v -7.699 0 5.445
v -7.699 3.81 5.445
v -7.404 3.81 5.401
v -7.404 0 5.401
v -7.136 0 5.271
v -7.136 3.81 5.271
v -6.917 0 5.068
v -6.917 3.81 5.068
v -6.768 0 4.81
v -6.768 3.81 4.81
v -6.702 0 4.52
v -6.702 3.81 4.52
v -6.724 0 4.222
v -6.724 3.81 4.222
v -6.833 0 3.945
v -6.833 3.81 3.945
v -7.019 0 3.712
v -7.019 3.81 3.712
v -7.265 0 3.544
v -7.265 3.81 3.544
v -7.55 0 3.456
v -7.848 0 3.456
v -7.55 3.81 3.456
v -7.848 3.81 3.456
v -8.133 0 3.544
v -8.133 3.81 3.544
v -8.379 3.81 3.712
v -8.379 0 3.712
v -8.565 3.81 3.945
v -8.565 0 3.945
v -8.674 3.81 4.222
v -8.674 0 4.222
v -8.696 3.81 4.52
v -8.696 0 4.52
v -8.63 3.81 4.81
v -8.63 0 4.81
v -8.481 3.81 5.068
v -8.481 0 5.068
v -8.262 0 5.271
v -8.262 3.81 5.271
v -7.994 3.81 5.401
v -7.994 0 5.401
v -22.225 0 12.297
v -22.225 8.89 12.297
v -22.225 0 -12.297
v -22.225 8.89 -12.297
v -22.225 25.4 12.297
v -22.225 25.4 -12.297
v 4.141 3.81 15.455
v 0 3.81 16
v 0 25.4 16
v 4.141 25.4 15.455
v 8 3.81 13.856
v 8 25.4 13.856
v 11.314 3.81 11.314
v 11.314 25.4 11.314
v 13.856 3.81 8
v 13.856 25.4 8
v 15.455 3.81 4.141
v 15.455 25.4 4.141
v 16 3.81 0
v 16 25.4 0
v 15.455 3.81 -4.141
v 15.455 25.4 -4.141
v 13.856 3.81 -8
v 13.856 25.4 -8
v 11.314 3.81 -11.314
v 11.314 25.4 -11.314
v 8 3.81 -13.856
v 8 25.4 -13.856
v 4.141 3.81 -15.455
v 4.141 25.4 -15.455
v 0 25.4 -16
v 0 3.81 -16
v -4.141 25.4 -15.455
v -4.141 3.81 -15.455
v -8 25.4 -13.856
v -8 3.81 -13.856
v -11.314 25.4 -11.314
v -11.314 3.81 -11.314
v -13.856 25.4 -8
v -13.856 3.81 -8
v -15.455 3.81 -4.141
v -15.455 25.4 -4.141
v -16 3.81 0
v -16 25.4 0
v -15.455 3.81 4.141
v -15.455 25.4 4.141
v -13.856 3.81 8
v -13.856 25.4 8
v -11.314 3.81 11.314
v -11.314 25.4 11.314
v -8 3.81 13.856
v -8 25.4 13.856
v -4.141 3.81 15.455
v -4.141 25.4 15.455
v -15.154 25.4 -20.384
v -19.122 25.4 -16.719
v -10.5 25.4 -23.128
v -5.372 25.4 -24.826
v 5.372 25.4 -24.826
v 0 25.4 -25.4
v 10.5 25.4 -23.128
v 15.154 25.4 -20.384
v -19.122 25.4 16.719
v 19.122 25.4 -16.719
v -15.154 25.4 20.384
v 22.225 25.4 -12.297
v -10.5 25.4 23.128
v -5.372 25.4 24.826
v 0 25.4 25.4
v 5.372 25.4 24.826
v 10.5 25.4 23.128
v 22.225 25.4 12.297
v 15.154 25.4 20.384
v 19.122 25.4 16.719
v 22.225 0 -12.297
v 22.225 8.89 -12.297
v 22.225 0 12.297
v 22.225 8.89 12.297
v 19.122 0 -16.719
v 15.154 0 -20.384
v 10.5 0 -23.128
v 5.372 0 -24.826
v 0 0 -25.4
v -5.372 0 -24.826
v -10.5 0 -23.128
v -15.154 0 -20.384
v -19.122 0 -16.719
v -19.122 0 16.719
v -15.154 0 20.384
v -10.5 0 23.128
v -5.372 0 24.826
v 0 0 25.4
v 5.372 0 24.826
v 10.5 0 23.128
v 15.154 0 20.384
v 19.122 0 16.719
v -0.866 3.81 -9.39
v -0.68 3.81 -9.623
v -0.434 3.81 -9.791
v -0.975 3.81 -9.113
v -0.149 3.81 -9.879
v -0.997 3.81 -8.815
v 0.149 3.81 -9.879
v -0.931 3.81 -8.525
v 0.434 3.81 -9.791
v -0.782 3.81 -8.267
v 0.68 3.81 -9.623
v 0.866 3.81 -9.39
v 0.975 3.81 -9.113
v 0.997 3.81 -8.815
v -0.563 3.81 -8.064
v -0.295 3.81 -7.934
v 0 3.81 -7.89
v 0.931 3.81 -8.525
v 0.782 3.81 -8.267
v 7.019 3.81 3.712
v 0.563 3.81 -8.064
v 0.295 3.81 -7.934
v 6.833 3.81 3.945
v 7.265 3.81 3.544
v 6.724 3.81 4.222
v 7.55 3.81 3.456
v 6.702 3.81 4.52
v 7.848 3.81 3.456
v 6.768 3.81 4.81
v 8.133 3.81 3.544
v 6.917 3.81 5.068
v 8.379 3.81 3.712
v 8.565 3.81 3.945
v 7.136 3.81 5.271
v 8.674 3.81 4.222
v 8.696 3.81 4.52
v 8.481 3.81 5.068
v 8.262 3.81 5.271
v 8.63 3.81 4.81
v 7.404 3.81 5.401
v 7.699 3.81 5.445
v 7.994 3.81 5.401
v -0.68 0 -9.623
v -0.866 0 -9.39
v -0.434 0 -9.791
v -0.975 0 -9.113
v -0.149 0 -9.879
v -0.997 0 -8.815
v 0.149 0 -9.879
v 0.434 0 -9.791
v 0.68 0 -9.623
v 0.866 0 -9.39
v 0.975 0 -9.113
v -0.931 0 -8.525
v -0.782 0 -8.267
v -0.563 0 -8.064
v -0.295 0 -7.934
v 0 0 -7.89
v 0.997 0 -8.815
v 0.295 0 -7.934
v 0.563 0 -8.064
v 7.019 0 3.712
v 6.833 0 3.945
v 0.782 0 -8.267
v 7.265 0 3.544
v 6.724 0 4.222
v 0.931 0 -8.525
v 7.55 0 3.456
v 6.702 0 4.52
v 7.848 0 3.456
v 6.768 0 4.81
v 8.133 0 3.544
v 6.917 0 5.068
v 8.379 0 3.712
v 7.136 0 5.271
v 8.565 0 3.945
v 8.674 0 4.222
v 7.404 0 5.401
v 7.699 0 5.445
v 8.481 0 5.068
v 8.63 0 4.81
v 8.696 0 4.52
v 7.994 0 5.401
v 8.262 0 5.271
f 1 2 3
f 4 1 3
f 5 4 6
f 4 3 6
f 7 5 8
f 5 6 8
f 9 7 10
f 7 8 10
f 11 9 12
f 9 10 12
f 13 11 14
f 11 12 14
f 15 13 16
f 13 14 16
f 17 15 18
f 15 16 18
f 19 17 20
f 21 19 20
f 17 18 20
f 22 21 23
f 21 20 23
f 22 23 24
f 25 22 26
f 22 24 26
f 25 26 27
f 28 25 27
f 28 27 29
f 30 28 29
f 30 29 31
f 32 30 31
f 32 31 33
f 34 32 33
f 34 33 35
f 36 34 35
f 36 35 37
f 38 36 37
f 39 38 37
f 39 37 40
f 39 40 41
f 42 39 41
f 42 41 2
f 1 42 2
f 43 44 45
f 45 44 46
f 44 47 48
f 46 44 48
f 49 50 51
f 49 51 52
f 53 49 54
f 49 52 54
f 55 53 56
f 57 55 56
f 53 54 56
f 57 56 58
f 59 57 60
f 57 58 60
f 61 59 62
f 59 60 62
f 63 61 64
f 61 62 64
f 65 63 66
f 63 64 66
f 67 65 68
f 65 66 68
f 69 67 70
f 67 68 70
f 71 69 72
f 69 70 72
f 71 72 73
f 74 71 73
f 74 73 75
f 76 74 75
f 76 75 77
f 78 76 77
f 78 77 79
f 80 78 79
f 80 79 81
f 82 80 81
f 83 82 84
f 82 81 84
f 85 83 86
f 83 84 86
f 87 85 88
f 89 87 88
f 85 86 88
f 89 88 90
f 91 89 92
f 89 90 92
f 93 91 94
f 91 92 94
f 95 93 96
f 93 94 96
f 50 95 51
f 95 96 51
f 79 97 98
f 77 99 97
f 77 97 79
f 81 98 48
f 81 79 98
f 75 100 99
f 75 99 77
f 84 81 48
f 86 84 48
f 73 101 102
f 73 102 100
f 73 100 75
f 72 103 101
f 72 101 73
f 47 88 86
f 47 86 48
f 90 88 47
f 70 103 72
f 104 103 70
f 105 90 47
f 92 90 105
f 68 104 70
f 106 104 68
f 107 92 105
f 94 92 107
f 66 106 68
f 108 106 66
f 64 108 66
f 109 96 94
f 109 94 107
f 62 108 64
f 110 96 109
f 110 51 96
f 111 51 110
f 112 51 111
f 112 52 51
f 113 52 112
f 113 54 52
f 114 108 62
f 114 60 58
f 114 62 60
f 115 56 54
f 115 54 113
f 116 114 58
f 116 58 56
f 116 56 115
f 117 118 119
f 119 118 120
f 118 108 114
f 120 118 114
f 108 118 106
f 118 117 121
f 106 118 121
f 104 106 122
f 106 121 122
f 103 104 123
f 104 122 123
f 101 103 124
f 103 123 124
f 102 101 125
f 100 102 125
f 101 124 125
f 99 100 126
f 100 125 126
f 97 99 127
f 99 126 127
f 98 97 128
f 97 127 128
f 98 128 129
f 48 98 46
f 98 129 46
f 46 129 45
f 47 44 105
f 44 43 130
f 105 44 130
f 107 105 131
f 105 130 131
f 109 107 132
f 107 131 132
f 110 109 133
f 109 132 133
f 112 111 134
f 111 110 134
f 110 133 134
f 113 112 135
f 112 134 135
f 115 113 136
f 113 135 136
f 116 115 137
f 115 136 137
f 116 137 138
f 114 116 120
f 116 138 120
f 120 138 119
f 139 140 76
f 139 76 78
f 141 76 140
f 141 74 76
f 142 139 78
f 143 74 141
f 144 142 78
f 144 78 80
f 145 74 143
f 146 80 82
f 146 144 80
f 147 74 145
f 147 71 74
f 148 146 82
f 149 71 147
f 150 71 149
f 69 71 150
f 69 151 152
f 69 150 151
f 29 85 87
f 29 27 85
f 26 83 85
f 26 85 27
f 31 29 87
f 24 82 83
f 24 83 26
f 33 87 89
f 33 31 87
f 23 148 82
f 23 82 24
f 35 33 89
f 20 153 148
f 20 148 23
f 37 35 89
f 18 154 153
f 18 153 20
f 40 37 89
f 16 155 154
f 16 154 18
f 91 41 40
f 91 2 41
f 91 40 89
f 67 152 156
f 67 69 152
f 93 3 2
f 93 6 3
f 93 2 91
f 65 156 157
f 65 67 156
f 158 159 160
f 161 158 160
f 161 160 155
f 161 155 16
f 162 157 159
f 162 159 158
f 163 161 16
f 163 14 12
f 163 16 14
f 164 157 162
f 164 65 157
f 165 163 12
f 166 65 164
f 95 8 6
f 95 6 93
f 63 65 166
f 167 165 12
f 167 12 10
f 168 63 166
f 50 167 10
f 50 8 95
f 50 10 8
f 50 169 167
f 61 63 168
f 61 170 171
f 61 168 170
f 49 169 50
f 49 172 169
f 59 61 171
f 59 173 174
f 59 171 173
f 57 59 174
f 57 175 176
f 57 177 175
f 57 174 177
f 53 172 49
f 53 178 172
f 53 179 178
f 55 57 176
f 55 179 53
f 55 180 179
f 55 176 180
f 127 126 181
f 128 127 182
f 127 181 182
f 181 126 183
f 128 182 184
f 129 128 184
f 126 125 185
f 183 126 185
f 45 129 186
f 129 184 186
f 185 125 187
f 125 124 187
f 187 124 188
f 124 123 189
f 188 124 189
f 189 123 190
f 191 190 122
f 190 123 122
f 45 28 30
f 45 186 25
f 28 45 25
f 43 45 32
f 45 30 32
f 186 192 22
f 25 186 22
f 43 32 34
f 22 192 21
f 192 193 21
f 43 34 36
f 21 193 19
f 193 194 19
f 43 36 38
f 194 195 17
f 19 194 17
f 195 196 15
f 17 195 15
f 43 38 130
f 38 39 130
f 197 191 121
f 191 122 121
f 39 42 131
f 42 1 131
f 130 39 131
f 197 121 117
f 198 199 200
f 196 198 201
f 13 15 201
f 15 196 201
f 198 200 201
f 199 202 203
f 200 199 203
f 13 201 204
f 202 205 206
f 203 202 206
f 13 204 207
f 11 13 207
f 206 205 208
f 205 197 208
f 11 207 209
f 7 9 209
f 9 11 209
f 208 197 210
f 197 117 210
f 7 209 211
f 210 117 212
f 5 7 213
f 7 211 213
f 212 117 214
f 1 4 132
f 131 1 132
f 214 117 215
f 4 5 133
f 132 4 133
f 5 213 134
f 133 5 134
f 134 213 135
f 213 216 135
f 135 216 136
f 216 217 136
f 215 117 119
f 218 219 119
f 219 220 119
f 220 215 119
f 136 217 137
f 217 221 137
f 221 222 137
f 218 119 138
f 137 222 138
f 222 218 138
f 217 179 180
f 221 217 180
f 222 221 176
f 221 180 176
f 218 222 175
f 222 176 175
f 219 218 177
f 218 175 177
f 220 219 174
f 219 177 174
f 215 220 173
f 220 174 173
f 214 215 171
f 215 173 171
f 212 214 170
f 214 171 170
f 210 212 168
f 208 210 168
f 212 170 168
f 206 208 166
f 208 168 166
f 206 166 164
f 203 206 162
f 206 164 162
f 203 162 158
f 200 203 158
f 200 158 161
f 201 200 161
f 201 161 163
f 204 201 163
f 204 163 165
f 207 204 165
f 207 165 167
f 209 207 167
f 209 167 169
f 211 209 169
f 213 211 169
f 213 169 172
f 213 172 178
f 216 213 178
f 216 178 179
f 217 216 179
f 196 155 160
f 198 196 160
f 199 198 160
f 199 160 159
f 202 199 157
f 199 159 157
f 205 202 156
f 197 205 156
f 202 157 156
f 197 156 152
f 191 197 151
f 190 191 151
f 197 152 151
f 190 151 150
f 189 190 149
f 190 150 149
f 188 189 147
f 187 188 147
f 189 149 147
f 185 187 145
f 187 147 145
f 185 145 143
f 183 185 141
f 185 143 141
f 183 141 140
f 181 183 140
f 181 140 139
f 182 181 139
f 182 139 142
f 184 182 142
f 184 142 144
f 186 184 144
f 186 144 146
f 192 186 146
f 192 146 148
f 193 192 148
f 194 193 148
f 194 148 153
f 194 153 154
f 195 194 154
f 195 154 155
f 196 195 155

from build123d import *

# Parameters (mm, degrees)
SKETCH1_R                           = 25.4
BOSS_EXTRUDE1_DEPTH                 = 25.4
SKETCH2_R                           = 16
CUT_EXTRUDE1_DEPTH                  = 21.59
CUT_EXTRUDE2_REACH                  = 45.994
CUT_EXTRUDE2_END_RADIUS             = 25.4
SKETCH3_W                           = 3.175
SKETCH3_H                           = 16.51
CUT_EXTRUDE2_DIRECTION_2_REACH      = 45.994
CUT_EXTRUDE2_DIRECTION_2_END_RADIUS = 25.4
CUT_EXTRUDE3_REACH                  = 43.91
SKETCH4_R                           = 1
CUT_EXTRUDE4_REACH                  = 41.534


with BuildPart() as part:
    # Sketch1 → Boss-Extrude1 (new body)
    with BuildSketch(Plane(origin=(0, 0, 0), x_dir=(1, 0, 0), z_dir=(0, 1, 0))):
        with Locations(Location((0, 0, 0), (0, 0, 270))):
            Circle(SKETCH1_R)
    extrude(amount=BOSS_EXTRUDE1_DEPTH)

    # Sketch2 → Cut-Extrude1 (cut)
    with BuildSketch(Plane(origin=(0, 25.4, 0), x_dir=(1, 0, 0), z_dir=(0, 1, 0))):
        with Locations(Location((0, 0, 0), (0, 0, 270))):
            Circle(SKETCH2_R)
    extrude(amount=-CUT_EXTRUDE1_DEPTH, mode=Mode.SUBTRACT)

    # Cut-Extrude2: up to this cylinder (the profile starts inside it)
    cut_extrude2_end = Plane(origin=(0, 17.145, 0), z_dir=(0, -1, 0)) * Cylinder(CUT_EXTRUDE2_END_RADIUS, 143.788, mode=Mode.PRIVATE)
    # Sketch3 → Cut-Extrude2 (cut, up to the surface)
    with BuildSketch(Plane.XY, mode=Mode.PRIVATE) as cut_extrude2_sk1:
        with Locations((23.8125, 17.145)):
            Rectangle(SKETCH3_W, SKETCH3_H)
    cut_extrude2_tool1 = extrude(cut_extrude2_sk1.sketch, amount=-CUT_EXTRUDE2_REACH, mode=Mode.PRIVATE) & cut_extrude2_end
    add(cut_extrude2_tool1.solids().sort_by_distance((23.8125, 17.145, 0))[0], mode=Mode.SUBTRACT)
    # Sketch3 → Cut-Extrude2 (cut, up to the surface)
    with BuildSketch(Plane.XY, mode=Mode.PRIVATE) as cut_extrude2_sk2:
        with Locations((-23.8125, 17.145)):
            Rectangle(SKETCH3_W, SKETCH3_H)
    cut_extrude2_tool2 = extrude(cut_extrude2_sk2.sketch, amount=-CUT_EXTRUDE2_REACH, mode=Mode.PRIVATE) & cut_extrude2_end
    add(cut_extrude2_tool2.solids().sort_by_distance((-23.8125, 17.145, 0))[0], mode=Mode.SUBTRACT)

    # Cut-Extrude2 direction 2: up to this cylinder (the profile starts inside it)
    cut_extrude2_direction_2_end = Plane(origin=(0, 17.145, 0), z_dir=(0, -1, 0)) * Cylinder(CUT_EXTRUDE2_DIRECTION_2_END_RADIUS, 143.788, mode=Mode.PRIVATE)
    # Sketch3 → Cut-Extrude2 direction 2 (cut, up to the surface)
    with BuildSketch(Plane.XY, mode=Mode.PRIVATE) as cut_extrude2_direction_2_sk1:
        with Locations((23.8125, 17.145)):
            Rectangle(SKETCH3_W, SKETCH3_H)
    cut_extrude2_direction_2_tool1 = extrude(cut_extrude2_direction_2_sk1.sketch, amount=CUT_EXTRUDE2_DIRECTION_2_REACH, mode=Mode.PRIVATE) & cut_extrude2_direction_2_end
    add(cut_extrude2_direction_2_tool1.solids().sort_by_distance((23.8125, 17.145, 0))[0], mode=Mode.SUBTRACT)
    # Sketch3 → Cut-Extrude2 direction 2 (cut, up to the surface)
    with BuildSketch(Plane.XY, mode=Mode.PRIVATE) as cut_extrude2_direction_2_sk2:
        with Locations((-23.8125, 17.145)):
            Rectangle(SKETCH3_W, SKETCH3_H)
    cut_extrude2_direction_2_tool2 = extrude(cut_extrude2_direction_2_sk2.sketch, amount=CUT_EXTRUDE2_DIRECTION_2_REACH, mode=Mode.PRIVATE) & cut_extrude2_direction_2_end
    add(cut_extrude2_direction_2_tool2.solids().sort_by_distance((-23.8125, 17.145, 0))[0], mode=Mode.SUBTRACT)

    # Sketch4 → Cut-Extrude3 (cut, up to next)
    with BuildSketch(Plane(origin=(0, 3.81, 0), x_dir=(1, 0, 0), z_dir=(0, 1, 0)), mode=Mode.PRIVATE) as cut_extrude3_sk1:
        with Locations(Location((0, 8.89, 0), (0, 0, 270))):
            Circle(SKETCH4_R)
    cut_extrude3_tool1 = extrude(cut_extrude3_sk1.sketch, amount=-CUT_EXTRUDE3_REACH, mode=Mode.PRIVATE) & part.part
    # Sketch4 → Cut-Extrude3 (cut, up to next)
    with BuildSketch(Plane(origin=(0, 3.81, 0), x_dir=(1, 0, 0), z_dir=(0, 1, 0)), mode=Mode.PRIVATE) as cut_extrude3_sk2:
        with Locations(Location((7.69896584, -4.445, 0), (0, 0, 270))):
            Circle(SKETCH4_R)
    cut_extrude3_tool2 = extrude(cut_extrude3_sk2.sketch, amount=-CUT_EXTRUDE3_REACH, mode=Mode.PRIVATE) & part.part
    # Sketch4 → Cut-Extrude3 (cut, up to next)
    with BuildSketch(Plane(origin=(0, 3.81, 0), x_dir=(1, 0, 0), z_dir=(0, 1, 0)), mode=Mode.PRIVATE) as cut_extrude3_sk3:
        with Locations(Location((-7.69896584, -4.445, 0), (0, 0, 270))):
            Circle(SKETCH4_R)
    cut_extrude3_tool3 = extrude(cut_extrude3_sk3.sketch, amount=-CUT_EXTRUDE3_REACH, mode=Mode.PRIVATE) & part.part
    add(cut_extrude3_tool1.solids().sort_by_distance((0, 3.81, -8.89))[0], mode=Mode.SUBTRACT)
    add(cut_extrude3_tool2.solids().sort_by_distance((7.698966, 3.81, 4.445))[0], mode=Mode.SUBTRACT)
    add(cut_extrude3_tool3.solids().sort_by_distance((-7.698966, 3.81, 4.445))[0], mode=Mode.SUBTRACT)

    # Sketch5 → Cut-Extrude4 (cut, up to next)
    with BuildSketch(Plane(origin=(0, 8.89, 0), x_dir=(1, 0, 0), z_dir=(0, 1, 0)), mode=Mode.PRIVATE) as cut_extrude4_sk1:
        with BuildLine():
            Line((22.225, 12.296722124), (22.225, -12.296722124))
            ThreePointArc((22.225, -12.296722124), (25.4, 0), (22.225, 12.296722124))
        make_face()
    cut_extrude4_tool1 = extrude(cut_extrude4_sk1.sketch, amount=-CUT_EXTRUDE4_REACH, mode=Mode.PRIVATE) & part.part
    # Sketch5 → Cut-Extrude4 (cut, up to next)
    with BuildSketch(Plane(origin=(0, 8.89, 0), x_dir=(1, 0, 0), z_dir=(0, 1, 0)), mode=Mode.PRIVATE) as cut_extrude4_sk2:
        with BuildLine():
            Line((-22.225, -12.296722124), (-22.225, 12.296722124))
            ThreePointArc((-22.225, 12.296722124), (-25.4, 0), (-22.225, -12.296722124))
        make_face()
    cut_extrude4_tool2 = extrude(cut_extrude4_sk2.sketch, amount=-CUT_EXTRUDE4_REACH, mode=Mode.PRIVATE) & part.part
    add(cut_extrude4_tool1.solids().sort_by_distance((23.502059, 8.89, 0))[0], mode=Mode.SUBTRACT)
    add(cut_extrude4_tool2.solids().sort_by_distance((-23.502059, 8.89, 0))[0], mode=Mode.SUBTRACT)


solid = part.part
